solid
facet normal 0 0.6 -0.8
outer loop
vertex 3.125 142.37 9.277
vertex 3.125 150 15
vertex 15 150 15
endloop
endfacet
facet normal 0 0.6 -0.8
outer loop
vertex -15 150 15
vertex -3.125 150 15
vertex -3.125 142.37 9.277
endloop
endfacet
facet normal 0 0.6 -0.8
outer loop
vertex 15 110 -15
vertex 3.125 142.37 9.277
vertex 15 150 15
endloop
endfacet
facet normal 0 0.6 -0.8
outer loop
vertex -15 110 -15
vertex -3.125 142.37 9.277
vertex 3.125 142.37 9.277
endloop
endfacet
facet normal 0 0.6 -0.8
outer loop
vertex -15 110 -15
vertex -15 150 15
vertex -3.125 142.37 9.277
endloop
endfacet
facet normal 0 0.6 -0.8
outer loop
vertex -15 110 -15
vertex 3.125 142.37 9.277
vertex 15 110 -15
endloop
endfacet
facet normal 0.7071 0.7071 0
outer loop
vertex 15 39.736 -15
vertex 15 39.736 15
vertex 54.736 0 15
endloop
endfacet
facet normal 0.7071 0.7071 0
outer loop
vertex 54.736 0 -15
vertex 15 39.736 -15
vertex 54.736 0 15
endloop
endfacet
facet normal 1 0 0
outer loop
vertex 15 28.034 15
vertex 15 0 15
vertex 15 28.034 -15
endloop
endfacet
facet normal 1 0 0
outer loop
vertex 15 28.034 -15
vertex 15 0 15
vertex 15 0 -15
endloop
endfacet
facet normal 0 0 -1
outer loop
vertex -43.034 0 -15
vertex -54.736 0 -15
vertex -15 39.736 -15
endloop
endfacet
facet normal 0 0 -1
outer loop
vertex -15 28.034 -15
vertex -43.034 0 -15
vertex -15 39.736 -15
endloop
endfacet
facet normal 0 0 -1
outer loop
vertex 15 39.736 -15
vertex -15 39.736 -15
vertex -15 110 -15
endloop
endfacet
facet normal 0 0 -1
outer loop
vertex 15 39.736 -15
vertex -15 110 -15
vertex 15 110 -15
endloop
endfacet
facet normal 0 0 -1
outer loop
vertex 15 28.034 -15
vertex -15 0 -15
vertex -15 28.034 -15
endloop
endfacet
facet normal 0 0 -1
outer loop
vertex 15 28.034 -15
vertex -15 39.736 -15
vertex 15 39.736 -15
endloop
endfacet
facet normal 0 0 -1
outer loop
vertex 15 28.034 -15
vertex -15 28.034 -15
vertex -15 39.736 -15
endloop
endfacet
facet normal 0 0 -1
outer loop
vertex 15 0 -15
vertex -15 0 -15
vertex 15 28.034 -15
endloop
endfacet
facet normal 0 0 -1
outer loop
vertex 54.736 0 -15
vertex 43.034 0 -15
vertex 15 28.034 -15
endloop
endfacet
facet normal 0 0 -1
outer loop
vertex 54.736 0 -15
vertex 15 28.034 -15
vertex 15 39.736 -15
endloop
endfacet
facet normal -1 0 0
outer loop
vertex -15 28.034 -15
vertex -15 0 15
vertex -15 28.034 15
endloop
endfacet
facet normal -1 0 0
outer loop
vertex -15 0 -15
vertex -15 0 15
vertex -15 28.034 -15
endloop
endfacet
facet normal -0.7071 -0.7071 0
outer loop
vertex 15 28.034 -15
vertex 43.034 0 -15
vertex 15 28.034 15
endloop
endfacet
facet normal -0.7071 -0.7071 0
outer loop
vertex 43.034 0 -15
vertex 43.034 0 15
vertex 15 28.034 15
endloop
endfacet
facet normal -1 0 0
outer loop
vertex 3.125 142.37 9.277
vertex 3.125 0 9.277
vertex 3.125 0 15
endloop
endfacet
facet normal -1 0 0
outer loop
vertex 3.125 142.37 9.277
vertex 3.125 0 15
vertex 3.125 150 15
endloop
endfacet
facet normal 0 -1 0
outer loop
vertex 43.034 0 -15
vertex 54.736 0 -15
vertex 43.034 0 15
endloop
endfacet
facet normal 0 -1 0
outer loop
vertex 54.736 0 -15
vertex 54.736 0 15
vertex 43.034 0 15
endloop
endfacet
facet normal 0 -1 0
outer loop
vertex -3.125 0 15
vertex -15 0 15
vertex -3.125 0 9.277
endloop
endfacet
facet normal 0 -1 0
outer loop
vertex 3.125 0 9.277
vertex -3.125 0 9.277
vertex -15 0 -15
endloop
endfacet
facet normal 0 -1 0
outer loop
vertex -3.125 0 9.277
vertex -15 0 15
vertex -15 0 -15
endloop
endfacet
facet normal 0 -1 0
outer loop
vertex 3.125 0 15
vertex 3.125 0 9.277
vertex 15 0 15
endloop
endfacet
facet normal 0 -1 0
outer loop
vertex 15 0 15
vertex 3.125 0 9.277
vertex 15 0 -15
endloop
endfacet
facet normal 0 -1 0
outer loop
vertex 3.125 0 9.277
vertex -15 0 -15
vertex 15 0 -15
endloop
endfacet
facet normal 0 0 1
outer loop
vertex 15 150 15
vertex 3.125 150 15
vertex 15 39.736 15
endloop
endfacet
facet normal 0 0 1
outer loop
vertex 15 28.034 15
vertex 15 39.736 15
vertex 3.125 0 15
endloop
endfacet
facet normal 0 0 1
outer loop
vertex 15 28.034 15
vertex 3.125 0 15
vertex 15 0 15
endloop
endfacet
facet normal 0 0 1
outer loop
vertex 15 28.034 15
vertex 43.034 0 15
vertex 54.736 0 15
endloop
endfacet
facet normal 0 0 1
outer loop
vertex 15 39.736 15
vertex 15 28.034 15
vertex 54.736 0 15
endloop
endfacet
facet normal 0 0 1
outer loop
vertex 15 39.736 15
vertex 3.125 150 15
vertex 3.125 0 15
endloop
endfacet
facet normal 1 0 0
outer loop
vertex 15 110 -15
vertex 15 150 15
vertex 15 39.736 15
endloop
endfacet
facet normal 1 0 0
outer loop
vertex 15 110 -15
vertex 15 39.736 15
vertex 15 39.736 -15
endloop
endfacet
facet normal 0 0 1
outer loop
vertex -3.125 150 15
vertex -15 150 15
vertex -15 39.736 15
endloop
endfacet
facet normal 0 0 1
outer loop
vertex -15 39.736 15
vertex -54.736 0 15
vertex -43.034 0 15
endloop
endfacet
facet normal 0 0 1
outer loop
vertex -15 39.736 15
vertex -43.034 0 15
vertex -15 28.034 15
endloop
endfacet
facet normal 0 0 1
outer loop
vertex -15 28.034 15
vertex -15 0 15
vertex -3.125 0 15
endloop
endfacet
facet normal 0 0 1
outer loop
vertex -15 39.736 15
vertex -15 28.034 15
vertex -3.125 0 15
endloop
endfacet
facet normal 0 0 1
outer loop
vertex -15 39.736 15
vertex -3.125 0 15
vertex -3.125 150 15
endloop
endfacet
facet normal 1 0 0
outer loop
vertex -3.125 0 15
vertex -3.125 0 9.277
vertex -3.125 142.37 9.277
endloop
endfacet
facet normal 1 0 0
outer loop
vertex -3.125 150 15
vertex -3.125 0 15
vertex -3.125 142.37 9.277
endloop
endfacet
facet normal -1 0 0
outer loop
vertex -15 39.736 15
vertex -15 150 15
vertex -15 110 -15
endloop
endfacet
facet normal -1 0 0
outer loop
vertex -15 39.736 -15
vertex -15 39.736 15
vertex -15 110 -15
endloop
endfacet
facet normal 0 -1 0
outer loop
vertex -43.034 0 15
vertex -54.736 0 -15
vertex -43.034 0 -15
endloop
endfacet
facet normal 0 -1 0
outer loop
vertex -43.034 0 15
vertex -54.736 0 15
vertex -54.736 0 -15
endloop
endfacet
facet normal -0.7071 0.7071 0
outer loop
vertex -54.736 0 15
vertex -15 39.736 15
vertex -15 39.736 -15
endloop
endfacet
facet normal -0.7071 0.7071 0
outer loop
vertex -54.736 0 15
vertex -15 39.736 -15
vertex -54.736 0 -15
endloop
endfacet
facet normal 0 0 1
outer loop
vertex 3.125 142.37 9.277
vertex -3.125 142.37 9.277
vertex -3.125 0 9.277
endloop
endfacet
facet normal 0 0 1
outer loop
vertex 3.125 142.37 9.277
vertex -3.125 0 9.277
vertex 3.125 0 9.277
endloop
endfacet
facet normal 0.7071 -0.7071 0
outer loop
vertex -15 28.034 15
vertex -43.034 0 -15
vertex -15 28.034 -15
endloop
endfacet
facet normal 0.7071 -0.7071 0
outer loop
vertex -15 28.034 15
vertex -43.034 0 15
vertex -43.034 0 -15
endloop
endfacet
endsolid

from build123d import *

# Parameters (mm, degrees)
SKETCH1_W           = 30
SKETCH1_H           = 30
BOSS_EXTRUDE1_DEPTH = 150
BOSS_EXTRUDE2_DEPTH = 15
CUT_EXTRUDE1_DEPTH  = 70.736433232
SKETCH4_W           = 6.25
SKETCH4_H           = 11.445552978
CUT_EXTRUDE2_DEPTH  = 151


with BuildPart() as part:
    # Sketch1 → Boss-Extrude1 (new body)
    with BuildSketch(Plane(origin=(0, 0, 0), x_dir=(1, 0, 0), z_dir=(0, 1, 0))):
        Rectangle(SKETCH1_W, SKETCH1_H)
    extrude(amount=BOSS_EXTRUDE1_DEPTH)

    # Sketch2 → Boss-Extrude2 (add, symmetric)
    with BuildSketch(Plane.XY):
        Polygon((15, 39.736433232), (54.736433232, 0), (43.033817395, 0), (15, 28.033817395), align=None)
    boss_extrude2 = extrude(amount=BOSS_EXTRUDE2_DEPTH, both=True)

    # Mirror1: Boss-Extrude2 across plane
    add(boss_extrude2.mirror(Plane(origin=(0, 0, 0), x_dir=(0, 0, 1), z_dir=(1, 0, 0))))

    # Sketch3 → Cut-Extrude1 (cut, through all)
    with BuildSketch(Plane.ZY.offset(15)):
        Polygon((15, 150), (-15, 110), (-15, 150), align=None)
    extrude(amount=-CUT_EXTRUDE1_DEPTH, mode=Mode.SUBTRACT)

    # Sketch4 → Cut-Extrude2 (cut, through all)
    with BuildSketch(Plane.XZ):
        with Locations((0, 15)):
            Rectangle(SKETCH4_W, SKETCH4_H)
    extrude(amount=-CUT_EXTRUDE2_DEPTH, mode=Mode.SUBTRACT)


solid = part.part
